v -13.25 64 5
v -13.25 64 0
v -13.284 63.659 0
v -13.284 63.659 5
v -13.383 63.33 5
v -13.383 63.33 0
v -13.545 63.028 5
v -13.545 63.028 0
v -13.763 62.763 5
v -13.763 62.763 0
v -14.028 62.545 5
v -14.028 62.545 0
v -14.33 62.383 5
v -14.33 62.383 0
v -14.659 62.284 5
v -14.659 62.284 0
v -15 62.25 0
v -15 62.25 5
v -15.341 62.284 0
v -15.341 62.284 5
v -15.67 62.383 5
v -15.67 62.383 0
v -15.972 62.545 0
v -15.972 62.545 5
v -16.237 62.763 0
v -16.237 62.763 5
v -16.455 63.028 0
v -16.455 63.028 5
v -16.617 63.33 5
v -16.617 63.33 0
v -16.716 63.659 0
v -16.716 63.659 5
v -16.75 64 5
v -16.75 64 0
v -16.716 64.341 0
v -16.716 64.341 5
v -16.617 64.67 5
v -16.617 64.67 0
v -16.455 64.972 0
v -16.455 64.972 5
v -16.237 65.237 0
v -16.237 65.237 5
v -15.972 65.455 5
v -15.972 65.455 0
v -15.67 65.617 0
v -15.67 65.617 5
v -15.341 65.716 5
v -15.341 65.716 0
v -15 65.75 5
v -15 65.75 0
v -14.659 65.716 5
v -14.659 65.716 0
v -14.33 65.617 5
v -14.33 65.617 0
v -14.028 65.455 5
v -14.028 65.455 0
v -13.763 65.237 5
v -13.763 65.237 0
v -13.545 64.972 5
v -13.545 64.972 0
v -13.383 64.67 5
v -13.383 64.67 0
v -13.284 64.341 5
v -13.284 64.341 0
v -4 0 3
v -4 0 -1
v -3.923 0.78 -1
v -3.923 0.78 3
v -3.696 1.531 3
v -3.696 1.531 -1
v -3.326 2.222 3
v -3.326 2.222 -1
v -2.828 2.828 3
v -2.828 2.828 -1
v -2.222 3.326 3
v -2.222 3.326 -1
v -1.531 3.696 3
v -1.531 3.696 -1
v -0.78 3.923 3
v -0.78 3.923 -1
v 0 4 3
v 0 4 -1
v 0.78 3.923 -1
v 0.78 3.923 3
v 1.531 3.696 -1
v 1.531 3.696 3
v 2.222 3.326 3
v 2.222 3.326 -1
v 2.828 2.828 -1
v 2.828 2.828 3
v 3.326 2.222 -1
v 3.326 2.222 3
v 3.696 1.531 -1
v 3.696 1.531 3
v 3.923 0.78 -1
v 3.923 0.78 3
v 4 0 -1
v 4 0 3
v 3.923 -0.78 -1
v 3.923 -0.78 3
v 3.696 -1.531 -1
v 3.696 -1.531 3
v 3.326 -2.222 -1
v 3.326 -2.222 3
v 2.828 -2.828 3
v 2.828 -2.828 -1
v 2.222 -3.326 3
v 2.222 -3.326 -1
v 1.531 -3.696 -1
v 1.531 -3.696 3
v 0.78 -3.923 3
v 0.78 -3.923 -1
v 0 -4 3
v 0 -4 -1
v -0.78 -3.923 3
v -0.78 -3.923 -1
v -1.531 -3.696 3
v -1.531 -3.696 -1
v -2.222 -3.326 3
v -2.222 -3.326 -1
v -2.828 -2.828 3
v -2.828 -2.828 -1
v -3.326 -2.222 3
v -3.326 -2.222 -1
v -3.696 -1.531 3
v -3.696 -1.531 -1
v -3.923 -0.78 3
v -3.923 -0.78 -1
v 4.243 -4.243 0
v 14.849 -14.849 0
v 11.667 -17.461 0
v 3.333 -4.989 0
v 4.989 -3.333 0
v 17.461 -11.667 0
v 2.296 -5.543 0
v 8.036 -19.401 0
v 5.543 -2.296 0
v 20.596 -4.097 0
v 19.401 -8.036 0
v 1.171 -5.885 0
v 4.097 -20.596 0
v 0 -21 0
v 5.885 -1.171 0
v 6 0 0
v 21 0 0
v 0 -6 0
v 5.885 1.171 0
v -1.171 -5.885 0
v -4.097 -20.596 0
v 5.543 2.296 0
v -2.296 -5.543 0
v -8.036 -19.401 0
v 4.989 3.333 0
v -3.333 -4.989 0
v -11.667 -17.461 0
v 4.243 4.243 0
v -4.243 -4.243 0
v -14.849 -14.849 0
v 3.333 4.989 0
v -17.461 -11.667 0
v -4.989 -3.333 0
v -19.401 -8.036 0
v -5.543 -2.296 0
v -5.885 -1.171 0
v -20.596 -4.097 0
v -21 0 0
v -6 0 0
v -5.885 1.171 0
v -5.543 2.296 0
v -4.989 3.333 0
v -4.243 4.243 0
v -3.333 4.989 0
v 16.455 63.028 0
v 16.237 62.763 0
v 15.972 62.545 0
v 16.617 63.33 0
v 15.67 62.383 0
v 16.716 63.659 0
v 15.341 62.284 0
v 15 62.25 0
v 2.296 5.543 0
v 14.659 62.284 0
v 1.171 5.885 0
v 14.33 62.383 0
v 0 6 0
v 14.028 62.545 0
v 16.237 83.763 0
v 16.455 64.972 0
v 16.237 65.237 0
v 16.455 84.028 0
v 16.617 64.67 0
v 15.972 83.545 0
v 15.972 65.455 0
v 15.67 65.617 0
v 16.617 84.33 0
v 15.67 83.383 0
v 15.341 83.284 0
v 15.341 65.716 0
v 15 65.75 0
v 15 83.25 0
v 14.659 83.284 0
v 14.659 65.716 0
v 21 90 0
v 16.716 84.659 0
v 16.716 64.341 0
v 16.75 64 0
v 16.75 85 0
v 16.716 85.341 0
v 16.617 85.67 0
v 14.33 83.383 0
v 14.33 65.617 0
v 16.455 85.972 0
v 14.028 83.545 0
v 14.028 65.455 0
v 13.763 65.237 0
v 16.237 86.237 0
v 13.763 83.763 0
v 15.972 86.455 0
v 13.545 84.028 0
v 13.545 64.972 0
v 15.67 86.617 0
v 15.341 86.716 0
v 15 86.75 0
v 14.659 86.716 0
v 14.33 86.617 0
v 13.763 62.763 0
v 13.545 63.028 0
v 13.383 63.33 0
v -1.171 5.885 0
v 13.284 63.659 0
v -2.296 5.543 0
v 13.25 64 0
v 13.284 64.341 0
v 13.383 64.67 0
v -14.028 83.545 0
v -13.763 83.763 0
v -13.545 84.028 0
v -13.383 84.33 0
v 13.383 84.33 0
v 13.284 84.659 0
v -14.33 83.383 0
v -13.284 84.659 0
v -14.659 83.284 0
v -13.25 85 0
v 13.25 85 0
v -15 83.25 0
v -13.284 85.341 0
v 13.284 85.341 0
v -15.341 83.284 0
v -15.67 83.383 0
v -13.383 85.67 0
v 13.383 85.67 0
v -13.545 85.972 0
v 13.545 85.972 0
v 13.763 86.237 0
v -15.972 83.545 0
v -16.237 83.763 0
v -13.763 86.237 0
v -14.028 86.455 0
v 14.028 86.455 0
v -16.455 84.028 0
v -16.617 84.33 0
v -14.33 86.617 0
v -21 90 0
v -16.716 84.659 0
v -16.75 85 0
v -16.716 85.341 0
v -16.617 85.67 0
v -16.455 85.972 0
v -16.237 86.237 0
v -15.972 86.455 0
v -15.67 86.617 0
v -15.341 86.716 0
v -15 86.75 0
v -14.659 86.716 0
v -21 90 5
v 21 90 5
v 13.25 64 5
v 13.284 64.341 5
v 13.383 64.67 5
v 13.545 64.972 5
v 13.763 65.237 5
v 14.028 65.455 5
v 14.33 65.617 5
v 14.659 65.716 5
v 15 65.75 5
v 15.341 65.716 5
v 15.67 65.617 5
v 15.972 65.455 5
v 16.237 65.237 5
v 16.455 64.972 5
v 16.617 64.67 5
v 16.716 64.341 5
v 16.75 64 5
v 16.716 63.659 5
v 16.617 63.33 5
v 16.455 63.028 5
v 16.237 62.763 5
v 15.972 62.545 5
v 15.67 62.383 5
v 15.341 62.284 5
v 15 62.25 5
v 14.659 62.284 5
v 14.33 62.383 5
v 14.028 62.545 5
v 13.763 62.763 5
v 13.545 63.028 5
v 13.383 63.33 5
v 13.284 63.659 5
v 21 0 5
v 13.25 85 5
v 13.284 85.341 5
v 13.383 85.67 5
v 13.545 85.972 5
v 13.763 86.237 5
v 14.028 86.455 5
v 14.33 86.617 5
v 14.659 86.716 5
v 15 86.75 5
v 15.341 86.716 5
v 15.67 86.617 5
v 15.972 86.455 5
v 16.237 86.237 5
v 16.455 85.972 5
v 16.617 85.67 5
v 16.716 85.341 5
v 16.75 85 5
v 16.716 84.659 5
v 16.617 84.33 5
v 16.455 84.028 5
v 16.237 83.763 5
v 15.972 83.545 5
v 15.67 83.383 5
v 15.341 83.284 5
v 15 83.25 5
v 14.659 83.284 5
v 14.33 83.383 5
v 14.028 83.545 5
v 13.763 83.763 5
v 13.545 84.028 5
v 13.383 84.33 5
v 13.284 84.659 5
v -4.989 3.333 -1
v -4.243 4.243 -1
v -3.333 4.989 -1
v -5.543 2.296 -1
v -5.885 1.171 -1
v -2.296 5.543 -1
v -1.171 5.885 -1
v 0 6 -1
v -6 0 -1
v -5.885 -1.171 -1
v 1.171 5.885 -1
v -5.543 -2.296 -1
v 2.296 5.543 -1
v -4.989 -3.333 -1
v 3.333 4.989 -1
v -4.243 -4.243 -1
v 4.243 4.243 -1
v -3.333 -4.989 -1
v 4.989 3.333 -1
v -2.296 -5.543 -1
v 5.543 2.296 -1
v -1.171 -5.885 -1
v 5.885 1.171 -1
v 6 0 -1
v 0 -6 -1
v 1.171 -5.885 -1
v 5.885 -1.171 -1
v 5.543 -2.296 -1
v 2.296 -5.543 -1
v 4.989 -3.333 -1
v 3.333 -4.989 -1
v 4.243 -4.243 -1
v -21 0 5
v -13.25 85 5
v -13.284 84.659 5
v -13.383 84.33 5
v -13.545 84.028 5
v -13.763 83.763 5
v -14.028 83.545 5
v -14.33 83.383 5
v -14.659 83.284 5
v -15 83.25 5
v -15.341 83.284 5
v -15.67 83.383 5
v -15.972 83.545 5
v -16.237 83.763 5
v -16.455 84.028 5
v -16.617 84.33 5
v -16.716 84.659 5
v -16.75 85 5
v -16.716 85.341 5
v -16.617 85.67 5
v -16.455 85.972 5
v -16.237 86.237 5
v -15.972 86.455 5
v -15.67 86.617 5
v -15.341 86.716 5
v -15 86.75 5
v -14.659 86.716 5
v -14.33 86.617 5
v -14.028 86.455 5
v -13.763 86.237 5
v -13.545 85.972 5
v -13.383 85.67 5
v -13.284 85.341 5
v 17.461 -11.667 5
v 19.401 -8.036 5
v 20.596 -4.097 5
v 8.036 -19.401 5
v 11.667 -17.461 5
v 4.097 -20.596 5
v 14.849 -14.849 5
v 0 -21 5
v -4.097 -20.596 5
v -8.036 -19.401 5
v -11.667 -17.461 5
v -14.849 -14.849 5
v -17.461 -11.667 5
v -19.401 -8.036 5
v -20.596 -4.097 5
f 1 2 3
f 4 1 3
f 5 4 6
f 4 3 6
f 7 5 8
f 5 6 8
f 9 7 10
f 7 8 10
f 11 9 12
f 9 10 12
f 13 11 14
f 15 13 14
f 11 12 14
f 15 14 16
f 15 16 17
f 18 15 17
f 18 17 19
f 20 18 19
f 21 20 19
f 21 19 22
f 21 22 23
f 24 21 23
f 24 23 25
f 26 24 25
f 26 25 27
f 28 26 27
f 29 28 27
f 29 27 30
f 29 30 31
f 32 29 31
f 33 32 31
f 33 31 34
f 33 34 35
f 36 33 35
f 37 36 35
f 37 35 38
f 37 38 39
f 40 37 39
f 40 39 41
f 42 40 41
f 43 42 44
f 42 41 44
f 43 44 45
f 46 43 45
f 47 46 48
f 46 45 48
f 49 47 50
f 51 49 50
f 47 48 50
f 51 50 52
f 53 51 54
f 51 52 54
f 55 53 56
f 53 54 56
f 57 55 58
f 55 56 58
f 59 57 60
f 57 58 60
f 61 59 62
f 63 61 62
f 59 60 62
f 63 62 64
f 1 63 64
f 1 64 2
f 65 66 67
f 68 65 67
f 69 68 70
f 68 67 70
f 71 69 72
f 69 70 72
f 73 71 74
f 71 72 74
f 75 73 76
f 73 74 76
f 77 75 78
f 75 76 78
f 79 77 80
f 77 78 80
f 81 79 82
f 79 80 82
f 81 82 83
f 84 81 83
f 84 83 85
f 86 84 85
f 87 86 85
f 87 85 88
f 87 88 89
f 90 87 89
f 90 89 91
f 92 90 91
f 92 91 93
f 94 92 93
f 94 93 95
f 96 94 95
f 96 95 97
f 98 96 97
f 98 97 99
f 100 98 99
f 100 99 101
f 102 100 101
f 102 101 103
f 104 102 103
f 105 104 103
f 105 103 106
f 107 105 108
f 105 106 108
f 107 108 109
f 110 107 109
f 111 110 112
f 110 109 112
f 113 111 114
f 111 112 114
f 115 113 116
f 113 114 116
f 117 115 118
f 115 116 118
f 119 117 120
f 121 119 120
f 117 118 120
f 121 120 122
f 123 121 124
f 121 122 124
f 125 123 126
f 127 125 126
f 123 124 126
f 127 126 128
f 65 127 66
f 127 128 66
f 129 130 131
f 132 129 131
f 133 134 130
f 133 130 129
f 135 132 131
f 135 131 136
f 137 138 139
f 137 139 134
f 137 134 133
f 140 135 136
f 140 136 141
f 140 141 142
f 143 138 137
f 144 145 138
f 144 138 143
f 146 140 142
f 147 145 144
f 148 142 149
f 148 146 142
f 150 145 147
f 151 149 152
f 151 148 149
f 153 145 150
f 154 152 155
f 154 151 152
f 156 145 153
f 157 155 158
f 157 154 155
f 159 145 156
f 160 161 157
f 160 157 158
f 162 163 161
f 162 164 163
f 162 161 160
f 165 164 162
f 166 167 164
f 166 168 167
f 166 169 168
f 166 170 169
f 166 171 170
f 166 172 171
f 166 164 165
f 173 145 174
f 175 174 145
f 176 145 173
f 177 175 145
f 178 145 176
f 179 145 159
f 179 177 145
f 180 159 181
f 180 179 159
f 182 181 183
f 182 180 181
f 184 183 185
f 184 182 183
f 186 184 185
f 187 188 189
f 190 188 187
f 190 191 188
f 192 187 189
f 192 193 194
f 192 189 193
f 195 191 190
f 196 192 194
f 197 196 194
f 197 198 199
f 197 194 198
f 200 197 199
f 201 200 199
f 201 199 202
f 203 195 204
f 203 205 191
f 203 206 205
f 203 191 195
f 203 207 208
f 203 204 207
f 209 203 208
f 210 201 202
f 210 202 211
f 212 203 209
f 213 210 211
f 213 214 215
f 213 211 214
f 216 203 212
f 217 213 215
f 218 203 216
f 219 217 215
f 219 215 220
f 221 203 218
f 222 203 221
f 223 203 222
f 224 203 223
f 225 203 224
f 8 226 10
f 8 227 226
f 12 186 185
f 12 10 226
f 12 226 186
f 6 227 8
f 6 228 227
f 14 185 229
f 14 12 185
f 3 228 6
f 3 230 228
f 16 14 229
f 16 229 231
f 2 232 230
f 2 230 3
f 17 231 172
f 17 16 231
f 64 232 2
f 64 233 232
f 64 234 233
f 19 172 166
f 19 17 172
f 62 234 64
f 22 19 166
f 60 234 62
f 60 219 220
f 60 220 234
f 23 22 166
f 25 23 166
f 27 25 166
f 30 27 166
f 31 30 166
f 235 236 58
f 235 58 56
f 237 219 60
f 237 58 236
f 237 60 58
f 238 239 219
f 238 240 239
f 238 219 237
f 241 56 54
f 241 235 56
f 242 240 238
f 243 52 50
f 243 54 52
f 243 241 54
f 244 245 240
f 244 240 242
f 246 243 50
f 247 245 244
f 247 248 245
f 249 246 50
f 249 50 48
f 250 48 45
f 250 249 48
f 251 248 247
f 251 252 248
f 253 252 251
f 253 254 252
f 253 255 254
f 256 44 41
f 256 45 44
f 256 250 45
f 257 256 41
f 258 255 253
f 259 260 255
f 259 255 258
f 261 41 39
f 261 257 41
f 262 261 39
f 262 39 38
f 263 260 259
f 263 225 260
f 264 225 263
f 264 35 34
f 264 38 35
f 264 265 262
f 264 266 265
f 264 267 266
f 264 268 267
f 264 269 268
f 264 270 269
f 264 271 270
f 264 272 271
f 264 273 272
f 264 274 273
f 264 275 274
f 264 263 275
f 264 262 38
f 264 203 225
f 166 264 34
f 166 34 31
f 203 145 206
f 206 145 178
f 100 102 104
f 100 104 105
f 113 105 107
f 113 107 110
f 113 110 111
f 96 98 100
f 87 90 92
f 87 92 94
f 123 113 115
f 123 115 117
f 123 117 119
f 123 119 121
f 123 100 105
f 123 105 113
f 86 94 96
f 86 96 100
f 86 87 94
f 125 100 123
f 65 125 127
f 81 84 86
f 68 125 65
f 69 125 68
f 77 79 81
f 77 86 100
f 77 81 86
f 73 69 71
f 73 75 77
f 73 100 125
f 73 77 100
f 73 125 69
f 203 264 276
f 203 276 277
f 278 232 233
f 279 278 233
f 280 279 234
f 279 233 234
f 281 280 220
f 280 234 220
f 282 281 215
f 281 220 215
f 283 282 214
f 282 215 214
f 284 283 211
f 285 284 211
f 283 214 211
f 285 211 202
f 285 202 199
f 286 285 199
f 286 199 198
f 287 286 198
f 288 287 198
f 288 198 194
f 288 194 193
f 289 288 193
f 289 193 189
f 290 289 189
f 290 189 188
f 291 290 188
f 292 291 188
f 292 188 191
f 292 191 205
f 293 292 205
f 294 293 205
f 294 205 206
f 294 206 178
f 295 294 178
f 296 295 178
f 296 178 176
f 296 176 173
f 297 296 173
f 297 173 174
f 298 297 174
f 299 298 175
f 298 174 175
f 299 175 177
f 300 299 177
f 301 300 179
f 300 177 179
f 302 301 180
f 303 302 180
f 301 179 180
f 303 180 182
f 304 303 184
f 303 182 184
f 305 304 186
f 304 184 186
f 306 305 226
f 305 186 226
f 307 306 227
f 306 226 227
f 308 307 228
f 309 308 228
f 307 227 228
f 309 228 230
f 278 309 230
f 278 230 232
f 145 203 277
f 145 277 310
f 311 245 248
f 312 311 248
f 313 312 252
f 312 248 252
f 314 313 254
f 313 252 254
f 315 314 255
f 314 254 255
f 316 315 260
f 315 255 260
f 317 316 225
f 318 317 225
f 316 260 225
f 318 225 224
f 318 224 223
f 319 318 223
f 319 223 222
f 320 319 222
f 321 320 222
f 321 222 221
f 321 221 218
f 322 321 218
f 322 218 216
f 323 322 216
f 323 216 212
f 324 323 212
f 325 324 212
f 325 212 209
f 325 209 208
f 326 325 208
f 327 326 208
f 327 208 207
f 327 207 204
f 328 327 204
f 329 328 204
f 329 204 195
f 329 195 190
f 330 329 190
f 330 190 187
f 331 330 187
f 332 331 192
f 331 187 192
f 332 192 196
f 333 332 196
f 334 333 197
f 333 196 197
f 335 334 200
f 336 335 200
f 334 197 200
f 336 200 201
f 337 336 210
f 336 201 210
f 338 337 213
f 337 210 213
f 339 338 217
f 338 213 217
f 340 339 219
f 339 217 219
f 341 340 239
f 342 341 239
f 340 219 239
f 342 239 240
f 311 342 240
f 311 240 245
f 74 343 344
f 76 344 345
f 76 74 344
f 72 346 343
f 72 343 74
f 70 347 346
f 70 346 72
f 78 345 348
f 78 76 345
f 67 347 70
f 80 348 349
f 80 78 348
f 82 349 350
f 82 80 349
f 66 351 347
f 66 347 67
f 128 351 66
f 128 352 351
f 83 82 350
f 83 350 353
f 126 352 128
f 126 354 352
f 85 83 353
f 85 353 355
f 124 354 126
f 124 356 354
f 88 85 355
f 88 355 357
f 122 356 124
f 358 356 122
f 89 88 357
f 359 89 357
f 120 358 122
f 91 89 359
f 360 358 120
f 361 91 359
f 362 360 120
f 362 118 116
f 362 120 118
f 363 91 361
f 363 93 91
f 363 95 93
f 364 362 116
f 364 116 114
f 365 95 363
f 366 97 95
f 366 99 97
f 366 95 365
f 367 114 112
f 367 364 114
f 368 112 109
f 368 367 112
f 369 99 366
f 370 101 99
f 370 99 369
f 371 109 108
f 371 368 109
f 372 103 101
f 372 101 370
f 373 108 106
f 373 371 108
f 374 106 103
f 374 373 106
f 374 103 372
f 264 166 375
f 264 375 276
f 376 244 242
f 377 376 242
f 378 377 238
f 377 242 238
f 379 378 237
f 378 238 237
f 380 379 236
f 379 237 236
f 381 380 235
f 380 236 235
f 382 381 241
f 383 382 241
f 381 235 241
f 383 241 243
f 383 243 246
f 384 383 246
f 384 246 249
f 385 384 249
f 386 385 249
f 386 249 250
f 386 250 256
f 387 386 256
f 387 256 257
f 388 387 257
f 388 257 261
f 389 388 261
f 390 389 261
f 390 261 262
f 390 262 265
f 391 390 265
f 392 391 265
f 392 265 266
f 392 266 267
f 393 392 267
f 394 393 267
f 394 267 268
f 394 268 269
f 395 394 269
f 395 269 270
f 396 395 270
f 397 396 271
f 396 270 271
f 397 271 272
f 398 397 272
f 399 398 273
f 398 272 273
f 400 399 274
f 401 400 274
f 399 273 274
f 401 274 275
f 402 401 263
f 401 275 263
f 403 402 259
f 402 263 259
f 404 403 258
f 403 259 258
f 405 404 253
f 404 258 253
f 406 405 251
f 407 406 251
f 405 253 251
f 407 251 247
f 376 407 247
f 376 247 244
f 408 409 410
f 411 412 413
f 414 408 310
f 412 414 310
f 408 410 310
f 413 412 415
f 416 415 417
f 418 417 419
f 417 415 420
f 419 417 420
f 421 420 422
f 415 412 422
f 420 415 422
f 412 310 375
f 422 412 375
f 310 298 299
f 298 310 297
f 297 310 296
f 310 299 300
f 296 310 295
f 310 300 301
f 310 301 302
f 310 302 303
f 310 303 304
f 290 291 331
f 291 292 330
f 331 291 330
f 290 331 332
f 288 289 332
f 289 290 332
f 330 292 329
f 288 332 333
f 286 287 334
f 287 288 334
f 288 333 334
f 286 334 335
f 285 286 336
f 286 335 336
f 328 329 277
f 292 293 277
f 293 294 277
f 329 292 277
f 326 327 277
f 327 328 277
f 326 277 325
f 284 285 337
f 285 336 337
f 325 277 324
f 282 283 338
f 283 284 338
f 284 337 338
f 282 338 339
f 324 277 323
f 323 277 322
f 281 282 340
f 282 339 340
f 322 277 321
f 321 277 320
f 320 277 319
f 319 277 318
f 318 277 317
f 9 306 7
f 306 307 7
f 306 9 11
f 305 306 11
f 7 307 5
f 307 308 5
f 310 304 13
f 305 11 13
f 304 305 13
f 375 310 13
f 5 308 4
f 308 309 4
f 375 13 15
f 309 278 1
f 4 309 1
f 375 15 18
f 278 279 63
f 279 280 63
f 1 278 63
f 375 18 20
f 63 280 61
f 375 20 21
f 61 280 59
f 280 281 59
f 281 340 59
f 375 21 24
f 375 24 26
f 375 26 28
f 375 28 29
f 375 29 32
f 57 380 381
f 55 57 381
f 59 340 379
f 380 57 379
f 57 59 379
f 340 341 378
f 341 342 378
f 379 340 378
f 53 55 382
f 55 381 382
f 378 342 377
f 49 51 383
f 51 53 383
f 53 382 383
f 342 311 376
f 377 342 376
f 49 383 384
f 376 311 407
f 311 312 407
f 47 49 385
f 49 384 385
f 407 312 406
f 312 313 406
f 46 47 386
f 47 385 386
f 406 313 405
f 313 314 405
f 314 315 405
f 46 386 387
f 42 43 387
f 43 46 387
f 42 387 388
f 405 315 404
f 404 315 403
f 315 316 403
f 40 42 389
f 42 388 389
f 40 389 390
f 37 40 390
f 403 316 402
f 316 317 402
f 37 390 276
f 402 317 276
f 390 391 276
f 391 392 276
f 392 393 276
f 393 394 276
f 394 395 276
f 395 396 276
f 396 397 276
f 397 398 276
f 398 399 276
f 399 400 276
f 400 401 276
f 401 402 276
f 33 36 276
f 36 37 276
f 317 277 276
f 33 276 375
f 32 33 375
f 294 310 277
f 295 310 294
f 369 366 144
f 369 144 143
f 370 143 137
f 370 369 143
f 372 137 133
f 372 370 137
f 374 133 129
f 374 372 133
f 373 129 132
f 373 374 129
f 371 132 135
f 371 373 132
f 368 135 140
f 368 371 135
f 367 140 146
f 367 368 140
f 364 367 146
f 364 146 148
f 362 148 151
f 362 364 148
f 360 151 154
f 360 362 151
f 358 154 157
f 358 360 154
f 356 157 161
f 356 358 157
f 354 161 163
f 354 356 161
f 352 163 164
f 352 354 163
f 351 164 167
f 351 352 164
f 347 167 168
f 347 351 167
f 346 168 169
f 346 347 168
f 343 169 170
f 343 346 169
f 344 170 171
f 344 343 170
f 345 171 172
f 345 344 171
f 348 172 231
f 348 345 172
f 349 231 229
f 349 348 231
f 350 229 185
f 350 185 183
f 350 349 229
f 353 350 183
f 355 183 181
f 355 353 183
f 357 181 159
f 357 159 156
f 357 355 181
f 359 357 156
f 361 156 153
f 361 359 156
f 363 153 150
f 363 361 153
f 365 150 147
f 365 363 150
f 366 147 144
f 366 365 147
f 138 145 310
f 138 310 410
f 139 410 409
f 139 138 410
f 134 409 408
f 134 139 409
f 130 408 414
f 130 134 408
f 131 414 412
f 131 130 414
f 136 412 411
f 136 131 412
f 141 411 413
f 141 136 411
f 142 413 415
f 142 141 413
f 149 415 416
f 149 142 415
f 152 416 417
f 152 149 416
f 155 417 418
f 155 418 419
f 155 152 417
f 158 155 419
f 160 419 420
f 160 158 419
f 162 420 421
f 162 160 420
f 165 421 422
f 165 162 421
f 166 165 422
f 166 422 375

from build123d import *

# Parameters (mm, degrees)
BOSS_EXTRUDE1_DEPTH = 5
SKETCH2_R           = 1.75
CUT_EXTRUDE1_DEPTH  = 93.552687697
SKETCH3_R           = 4
CUT_EXTRUDE2_DEPTH  = 3
BOSS_EXTRUDE2_START = 1
SKETCH4_R           = 6
SKETCH4_R_2         = 4
BOSS_EXTRUDE2_DEPTH = 1


with BuildPart() as part:
    # Sketch1 → Boss-Extrude1 (new body)
    with BuildSketch(Plane.XY):
        with BuildLine():
            Line((-21, 0), (-21, 90))
            Line((-21, 90), (21, 90))
            Line((21, 90), (21, 0))
            ThreePointArc((21, 0), (0, -21), (-21, 0))
        make_face()
    extrude(amount=BOSS_EXTRUDE1_DEPTH)

    # Sketch2 → Cut-Extrude1 (cut, through all)
    with BuildSketch(Plane(origin=(0, 0, 0), x_dir=(-1, 0, 0), z_dir=(0, 0, -1))):
        with Locations((-15, 85)):
            Circle(SKETCH2_R)
        with Locations((-15, 64)):
            Circle(SKETCH2_R)
        with Locations(Location((15, 64, 0), (0, 0, 180))):
            Circle(SKETCH2_R)
        with Locations(Location((15, 85, 0), (0, 0, 180))):
            Circle(SKETCH2_R)
    extrude(amount=-CUT_EXTRUDE1_DEPTH, mode=Mode.SUBTRACT)

    # Sketch3 → Cut-Extrude2 (cut)
    with BuildSketch(Plane(origin=(0, 0, 0), x_dir=(-1, 0, 0), z_dir=(0, 0, -1))):
        Circle(SKETCH3_R)
    extrude(amount=-CUT_EXTRUDE2_DEPTH, mode=Mode.SUBTRACT)

    # Sketch4 → Boss-Extrude2 (add)
    with BuildSketch(Plane(origin=(0, 0, 0), x_dir=(-1, 0, 0), z_dir=(0, 0, -1)).offset(BOSS_EXTRUDE2_START)):
        with Locations(Location((0, 0, 0), (0, 0, 180))):
            Circle(SKETCH4_R)
        Circle(SKETCH4_R_2, mode=Mode.SUBTRACT)
    extrude(amount=-BOSS_EXTRUDE2_DEPTH)


solid = part.part
